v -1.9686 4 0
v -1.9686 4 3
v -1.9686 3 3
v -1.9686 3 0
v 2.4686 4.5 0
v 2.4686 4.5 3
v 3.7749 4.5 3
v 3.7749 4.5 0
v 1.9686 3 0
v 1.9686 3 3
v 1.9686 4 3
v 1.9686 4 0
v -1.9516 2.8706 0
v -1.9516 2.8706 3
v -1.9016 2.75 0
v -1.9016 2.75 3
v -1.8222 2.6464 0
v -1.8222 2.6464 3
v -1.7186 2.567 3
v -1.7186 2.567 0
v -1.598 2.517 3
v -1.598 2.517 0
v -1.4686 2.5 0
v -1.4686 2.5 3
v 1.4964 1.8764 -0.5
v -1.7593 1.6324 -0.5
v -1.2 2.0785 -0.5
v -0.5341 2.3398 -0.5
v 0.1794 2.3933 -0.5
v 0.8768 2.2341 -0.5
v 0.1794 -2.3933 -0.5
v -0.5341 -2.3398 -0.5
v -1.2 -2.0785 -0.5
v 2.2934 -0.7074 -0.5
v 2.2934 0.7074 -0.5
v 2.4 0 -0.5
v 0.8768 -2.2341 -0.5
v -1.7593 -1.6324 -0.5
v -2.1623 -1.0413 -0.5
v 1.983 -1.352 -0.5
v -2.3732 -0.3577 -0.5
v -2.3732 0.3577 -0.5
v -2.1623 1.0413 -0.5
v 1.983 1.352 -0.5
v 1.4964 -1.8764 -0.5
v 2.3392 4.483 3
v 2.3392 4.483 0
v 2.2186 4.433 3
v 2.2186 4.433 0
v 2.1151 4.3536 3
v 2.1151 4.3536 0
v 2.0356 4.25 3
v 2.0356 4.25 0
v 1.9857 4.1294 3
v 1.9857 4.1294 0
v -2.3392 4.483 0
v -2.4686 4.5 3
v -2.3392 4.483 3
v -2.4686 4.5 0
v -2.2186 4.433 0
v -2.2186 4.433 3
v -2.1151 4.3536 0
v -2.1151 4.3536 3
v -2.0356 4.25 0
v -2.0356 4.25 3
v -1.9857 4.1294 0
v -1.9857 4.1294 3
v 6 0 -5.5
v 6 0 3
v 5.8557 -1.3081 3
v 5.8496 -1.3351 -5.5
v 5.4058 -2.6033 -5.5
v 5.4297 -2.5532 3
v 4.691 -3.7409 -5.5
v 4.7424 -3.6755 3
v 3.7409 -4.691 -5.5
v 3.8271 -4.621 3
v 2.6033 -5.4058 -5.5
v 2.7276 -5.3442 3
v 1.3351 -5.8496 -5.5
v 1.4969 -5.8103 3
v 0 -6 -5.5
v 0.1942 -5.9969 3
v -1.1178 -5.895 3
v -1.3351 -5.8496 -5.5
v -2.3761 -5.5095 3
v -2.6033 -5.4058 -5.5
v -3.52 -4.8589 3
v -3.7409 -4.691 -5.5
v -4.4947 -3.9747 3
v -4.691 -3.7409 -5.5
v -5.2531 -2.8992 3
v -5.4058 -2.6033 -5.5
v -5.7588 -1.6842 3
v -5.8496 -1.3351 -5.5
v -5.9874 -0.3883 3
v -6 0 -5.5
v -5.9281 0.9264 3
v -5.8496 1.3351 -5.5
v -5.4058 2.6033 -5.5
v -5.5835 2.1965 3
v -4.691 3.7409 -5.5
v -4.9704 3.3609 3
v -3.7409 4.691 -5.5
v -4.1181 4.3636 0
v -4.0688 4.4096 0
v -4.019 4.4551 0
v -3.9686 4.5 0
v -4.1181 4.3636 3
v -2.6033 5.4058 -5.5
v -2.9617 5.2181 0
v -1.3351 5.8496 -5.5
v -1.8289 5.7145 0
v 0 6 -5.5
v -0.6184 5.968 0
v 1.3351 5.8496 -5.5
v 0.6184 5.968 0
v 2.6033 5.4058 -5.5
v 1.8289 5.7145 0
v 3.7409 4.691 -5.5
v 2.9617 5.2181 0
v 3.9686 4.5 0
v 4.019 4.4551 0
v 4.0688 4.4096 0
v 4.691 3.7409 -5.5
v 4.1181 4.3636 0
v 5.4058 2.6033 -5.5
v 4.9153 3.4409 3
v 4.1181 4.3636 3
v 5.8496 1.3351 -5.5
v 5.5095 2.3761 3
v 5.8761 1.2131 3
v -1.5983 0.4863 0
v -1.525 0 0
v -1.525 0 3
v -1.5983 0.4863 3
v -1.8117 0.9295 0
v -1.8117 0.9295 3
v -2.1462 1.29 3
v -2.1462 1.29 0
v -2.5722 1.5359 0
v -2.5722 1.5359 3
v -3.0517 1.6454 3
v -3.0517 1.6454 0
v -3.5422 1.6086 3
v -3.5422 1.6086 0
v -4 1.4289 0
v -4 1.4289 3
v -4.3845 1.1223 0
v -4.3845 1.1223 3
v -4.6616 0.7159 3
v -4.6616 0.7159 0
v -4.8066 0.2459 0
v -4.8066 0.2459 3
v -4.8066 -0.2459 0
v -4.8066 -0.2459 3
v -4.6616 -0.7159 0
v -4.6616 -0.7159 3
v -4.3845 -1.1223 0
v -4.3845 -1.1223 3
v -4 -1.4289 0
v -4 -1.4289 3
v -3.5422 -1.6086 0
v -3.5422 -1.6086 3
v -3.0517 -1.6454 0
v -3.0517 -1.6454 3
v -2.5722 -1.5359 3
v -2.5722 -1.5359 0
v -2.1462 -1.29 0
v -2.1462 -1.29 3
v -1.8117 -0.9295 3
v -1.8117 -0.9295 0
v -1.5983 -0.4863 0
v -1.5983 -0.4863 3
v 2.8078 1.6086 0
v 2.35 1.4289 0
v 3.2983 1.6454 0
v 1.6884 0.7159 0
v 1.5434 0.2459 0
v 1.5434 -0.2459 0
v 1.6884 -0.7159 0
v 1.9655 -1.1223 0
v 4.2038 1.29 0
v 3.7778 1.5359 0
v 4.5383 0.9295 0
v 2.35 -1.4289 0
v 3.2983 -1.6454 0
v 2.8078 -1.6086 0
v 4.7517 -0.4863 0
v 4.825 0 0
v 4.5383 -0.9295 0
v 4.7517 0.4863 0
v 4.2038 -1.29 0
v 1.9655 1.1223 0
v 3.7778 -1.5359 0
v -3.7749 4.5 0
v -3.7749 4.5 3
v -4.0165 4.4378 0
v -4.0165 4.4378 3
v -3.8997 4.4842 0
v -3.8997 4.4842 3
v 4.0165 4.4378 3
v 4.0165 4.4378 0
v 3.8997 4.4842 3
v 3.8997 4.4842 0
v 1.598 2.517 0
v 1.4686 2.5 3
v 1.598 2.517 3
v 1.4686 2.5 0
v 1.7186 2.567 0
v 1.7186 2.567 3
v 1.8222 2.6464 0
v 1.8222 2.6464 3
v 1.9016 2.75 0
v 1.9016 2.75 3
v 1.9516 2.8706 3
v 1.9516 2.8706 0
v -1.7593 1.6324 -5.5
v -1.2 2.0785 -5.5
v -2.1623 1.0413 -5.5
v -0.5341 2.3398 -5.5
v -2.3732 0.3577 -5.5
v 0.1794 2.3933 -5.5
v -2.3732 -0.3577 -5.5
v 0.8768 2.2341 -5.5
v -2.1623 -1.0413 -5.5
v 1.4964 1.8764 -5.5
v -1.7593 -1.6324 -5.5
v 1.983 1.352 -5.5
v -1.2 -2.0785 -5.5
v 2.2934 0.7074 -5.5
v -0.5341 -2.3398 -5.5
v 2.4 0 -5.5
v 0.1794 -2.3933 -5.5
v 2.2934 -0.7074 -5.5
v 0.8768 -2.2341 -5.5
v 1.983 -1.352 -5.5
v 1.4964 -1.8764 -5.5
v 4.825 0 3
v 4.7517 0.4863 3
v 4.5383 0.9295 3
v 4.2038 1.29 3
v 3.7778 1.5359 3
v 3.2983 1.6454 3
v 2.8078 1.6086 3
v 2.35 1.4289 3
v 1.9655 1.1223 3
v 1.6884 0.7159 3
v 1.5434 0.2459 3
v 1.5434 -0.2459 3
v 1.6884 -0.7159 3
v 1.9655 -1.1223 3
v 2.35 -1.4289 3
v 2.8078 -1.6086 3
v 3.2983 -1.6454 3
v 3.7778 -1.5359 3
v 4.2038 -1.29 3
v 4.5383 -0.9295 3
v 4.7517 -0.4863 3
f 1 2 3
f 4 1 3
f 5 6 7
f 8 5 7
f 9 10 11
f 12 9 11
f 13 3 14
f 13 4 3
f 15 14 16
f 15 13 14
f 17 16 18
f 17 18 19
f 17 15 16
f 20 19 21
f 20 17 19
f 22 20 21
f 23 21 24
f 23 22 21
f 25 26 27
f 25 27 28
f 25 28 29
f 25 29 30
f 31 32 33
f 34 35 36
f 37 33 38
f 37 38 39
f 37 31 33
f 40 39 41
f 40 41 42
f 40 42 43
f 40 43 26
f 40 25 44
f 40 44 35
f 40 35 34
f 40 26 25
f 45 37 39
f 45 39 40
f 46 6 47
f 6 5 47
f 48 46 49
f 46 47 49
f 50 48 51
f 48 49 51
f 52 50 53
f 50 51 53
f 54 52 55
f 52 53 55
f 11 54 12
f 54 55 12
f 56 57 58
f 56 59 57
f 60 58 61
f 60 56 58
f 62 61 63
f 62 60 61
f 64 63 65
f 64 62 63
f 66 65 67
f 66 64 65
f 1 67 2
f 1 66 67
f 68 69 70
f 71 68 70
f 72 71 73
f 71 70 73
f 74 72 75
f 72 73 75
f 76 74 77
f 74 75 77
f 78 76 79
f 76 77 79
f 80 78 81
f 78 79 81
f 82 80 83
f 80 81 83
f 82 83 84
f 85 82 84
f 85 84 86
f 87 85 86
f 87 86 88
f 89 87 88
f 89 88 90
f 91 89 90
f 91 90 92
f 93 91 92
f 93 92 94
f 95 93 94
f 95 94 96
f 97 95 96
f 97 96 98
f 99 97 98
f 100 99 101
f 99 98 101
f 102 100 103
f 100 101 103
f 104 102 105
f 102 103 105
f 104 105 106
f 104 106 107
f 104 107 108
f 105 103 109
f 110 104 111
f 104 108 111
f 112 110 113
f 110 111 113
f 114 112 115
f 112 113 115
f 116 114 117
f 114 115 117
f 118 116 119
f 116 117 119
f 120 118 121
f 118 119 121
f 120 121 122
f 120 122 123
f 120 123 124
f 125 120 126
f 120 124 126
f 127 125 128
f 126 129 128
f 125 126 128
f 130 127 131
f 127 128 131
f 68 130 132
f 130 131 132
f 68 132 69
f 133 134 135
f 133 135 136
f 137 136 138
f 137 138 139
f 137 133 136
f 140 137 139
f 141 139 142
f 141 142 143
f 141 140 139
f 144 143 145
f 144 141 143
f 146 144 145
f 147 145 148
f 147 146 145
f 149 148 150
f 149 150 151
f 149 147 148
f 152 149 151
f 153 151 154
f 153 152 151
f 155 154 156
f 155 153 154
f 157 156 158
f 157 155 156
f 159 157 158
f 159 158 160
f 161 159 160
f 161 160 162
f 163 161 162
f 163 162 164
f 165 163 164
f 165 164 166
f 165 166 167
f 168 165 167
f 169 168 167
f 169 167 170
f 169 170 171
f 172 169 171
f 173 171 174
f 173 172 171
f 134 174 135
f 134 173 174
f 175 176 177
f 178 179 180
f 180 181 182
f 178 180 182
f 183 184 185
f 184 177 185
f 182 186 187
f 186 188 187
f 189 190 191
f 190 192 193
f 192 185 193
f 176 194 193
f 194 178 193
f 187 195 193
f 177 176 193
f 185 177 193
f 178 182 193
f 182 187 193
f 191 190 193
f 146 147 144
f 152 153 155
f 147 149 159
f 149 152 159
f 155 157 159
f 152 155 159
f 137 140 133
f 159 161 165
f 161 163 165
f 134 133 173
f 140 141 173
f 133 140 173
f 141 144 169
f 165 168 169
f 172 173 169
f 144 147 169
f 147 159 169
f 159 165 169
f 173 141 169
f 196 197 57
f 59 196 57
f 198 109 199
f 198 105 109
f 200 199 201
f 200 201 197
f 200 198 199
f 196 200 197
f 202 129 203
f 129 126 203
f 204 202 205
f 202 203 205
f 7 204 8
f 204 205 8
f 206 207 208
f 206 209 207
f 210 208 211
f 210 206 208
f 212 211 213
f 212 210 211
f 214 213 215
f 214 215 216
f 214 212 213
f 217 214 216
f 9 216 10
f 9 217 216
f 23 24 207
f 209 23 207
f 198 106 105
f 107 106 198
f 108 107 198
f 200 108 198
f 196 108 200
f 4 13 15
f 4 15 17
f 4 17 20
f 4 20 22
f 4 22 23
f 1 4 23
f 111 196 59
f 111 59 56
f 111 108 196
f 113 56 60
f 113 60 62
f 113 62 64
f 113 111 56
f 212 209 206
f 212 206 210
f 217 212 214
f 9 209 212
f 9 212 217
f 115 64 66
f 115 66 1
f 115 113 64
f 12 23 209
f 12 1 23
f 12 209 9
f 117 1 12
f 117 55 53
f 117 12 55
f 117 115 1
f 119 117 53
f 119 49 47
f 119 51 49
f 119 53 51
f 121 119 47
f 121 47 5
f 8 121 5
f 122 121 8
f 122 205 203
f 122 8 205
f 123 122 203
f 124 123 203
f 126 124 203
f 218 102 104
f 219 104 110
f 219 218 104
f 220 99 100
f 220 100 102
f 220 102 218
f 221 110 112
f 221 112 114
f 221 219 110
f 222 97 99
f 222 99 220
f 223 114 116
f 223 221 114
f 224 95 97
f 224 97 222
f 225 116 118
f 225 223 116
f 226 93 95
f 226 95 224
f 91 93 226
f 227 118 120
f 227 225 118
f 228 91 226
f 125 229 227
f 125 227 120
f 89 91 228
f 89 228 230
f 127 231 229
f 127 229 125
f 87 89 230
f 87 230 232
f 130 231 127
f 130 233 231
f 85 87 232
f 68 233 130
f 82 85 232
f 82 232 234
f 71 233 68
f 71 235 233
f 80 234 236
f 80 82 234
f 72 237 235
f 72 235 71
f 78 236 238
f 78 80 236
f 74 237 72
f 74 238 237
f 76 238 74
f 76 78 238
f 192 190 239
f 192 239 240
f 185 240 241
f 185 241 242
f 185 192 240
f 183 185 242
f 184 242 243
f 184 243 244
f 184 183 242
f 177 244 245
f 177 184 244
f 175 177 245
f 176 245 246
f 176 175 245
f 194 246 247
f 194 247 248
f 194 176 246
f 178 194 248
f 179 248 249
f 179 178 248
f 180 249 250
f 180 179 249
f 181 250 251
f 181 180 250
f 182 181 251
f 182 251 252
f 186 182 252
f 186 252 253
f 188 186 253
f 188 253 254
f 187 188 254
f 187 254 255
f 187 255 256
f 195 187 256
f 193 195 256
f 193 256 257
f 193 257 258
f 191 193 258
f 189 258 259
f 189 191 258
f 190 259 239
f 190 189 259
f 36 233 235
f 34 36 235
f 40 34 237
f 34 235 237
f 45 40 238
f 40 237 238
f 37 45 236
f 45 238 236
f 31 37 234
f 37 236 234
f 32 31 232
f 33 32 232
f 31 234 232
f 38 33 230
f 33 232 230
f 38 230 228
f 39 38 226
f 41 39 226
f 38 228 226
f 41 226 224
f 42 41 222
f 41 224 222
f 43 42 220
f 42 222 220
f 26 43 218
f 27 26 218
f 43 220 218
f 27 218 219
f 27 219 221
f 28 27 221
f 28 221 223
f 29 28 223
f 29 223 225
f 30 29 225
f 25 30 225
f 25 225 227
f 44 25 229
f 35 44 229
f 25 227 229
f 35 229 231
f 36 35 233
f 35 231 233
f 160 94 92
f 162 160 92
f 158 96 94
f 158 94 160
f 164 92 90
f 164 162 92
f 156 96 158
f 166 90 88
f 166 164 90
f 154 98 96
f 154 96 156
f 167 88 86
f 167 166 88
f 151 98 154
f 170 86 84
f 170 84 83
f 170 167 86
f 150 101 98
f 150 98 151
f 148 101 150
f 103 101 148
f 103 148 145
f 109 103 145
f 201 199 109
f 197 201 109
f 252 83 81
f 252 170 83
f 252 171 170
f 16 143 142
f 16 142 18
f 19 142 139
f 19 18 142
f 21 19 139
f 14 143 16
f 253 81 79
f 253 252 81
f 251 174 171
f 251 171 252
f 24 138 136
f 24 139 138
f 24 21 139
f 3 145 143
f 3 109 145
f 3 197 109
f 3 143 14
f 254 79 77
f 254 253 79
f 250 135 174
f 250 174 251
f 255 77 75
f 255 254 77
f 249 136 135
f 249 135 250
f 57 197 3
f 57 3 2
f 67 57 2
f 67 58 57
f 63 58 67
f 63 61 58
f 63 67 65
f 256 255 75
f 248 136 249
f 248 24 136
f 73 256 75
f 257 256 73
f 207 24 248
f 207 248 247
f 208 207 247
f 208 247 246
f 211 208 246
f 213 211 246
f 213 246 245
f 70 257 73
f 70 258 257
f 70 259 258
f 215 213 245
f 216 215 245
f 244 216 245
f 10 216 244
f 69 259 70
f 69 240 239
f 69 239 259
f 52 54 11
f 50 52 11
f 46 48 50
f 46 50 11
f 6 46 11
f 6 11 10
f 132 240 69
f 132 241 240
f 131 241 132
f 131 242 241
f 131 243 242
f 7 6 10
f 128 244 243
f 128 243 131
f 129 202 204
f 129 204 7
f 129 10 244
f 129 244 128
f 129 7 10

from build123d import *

# Parameters (mm, degrees)
F0_R     = 6
F0_R_2   = 1.65
F1_DEPTH = 3
F2_R     = 6
F3_DEPTH = 5.5
F5_DEPTH = 3
F6_R     = 0.5
F7_R     = 2.4
F8_DEPTH = 5


with BuildPart() as f1:
    # F0 (on Top) → F1 (new body)
    with BuildSketch(Plane.XY):
        Circle(F0_R)
        with Locations((-3.175, 0)):
            Circle(F0_R_2, mode=Mode.SUBTRACT)
        with Locations((3.175, 0)):
            Circle(F0_R_2, mode=Mode.SUBTRACT)
    extrude(amount=F1_DEPTH)

    # F2 (on face) → F3 (join)
    with BuildSketch(Plane(origin=(0, 0, 0), x_dir=(1, 0, 0), z_dir=(0, 0, -1))):
        Circle(F2_R)
    extrude(amount=F3_DEPTH)

    # F4 (on face) → F5 (cut)
    with BuildSketch(Plane.XY.offset(3)):
        with BuildLine():
            ThreePointArc((3.968627, 4.5), (0, 6), (-3.968627, 4.5))
            Line((-3.968627, 4.5), (-1.968627, 4.5))
            Line((-1.968627, 4.5), (-1.968627, 2.5))
            Line((-1.968627, 2.5), (1.968627, 2.5))
            Line((1.968627, 2.5), (1.968627, 4.5))
            Line((1.968627, 4.5), (3.968627, 4.5))
        make_face()
    extrude(amount=-F5_DEPTH, mode=Mode.SUBTRACT)

    # F6
    f6_edges = [f1.edges().sort_by_distance(p)[0] for p in [
        (-3.968627, 4.5, 1.5),
        (-1.968627, 4.5, 1.5),
        (1.968627, 2.5, 1.5),
        (1.968627, 4.5, 1.5),
        (3.968627, 4.5, 1.5),
        (-1.968627, 2.5, 1.5),
    ]]
    fillet(f6_edges, radius=F6_R)

    # F7 (on face) → F8 (cut)
    with BuildSketch(Plane(origin=(0, 0, -5.5), x_dir=(1, 0, 0), z_dir=(0, 0, -1))):
        Circle(F7_R)
    extrude(amount=-F8_DEPTH, mode=Mode.SUBTRACT)


solid = f1.part
